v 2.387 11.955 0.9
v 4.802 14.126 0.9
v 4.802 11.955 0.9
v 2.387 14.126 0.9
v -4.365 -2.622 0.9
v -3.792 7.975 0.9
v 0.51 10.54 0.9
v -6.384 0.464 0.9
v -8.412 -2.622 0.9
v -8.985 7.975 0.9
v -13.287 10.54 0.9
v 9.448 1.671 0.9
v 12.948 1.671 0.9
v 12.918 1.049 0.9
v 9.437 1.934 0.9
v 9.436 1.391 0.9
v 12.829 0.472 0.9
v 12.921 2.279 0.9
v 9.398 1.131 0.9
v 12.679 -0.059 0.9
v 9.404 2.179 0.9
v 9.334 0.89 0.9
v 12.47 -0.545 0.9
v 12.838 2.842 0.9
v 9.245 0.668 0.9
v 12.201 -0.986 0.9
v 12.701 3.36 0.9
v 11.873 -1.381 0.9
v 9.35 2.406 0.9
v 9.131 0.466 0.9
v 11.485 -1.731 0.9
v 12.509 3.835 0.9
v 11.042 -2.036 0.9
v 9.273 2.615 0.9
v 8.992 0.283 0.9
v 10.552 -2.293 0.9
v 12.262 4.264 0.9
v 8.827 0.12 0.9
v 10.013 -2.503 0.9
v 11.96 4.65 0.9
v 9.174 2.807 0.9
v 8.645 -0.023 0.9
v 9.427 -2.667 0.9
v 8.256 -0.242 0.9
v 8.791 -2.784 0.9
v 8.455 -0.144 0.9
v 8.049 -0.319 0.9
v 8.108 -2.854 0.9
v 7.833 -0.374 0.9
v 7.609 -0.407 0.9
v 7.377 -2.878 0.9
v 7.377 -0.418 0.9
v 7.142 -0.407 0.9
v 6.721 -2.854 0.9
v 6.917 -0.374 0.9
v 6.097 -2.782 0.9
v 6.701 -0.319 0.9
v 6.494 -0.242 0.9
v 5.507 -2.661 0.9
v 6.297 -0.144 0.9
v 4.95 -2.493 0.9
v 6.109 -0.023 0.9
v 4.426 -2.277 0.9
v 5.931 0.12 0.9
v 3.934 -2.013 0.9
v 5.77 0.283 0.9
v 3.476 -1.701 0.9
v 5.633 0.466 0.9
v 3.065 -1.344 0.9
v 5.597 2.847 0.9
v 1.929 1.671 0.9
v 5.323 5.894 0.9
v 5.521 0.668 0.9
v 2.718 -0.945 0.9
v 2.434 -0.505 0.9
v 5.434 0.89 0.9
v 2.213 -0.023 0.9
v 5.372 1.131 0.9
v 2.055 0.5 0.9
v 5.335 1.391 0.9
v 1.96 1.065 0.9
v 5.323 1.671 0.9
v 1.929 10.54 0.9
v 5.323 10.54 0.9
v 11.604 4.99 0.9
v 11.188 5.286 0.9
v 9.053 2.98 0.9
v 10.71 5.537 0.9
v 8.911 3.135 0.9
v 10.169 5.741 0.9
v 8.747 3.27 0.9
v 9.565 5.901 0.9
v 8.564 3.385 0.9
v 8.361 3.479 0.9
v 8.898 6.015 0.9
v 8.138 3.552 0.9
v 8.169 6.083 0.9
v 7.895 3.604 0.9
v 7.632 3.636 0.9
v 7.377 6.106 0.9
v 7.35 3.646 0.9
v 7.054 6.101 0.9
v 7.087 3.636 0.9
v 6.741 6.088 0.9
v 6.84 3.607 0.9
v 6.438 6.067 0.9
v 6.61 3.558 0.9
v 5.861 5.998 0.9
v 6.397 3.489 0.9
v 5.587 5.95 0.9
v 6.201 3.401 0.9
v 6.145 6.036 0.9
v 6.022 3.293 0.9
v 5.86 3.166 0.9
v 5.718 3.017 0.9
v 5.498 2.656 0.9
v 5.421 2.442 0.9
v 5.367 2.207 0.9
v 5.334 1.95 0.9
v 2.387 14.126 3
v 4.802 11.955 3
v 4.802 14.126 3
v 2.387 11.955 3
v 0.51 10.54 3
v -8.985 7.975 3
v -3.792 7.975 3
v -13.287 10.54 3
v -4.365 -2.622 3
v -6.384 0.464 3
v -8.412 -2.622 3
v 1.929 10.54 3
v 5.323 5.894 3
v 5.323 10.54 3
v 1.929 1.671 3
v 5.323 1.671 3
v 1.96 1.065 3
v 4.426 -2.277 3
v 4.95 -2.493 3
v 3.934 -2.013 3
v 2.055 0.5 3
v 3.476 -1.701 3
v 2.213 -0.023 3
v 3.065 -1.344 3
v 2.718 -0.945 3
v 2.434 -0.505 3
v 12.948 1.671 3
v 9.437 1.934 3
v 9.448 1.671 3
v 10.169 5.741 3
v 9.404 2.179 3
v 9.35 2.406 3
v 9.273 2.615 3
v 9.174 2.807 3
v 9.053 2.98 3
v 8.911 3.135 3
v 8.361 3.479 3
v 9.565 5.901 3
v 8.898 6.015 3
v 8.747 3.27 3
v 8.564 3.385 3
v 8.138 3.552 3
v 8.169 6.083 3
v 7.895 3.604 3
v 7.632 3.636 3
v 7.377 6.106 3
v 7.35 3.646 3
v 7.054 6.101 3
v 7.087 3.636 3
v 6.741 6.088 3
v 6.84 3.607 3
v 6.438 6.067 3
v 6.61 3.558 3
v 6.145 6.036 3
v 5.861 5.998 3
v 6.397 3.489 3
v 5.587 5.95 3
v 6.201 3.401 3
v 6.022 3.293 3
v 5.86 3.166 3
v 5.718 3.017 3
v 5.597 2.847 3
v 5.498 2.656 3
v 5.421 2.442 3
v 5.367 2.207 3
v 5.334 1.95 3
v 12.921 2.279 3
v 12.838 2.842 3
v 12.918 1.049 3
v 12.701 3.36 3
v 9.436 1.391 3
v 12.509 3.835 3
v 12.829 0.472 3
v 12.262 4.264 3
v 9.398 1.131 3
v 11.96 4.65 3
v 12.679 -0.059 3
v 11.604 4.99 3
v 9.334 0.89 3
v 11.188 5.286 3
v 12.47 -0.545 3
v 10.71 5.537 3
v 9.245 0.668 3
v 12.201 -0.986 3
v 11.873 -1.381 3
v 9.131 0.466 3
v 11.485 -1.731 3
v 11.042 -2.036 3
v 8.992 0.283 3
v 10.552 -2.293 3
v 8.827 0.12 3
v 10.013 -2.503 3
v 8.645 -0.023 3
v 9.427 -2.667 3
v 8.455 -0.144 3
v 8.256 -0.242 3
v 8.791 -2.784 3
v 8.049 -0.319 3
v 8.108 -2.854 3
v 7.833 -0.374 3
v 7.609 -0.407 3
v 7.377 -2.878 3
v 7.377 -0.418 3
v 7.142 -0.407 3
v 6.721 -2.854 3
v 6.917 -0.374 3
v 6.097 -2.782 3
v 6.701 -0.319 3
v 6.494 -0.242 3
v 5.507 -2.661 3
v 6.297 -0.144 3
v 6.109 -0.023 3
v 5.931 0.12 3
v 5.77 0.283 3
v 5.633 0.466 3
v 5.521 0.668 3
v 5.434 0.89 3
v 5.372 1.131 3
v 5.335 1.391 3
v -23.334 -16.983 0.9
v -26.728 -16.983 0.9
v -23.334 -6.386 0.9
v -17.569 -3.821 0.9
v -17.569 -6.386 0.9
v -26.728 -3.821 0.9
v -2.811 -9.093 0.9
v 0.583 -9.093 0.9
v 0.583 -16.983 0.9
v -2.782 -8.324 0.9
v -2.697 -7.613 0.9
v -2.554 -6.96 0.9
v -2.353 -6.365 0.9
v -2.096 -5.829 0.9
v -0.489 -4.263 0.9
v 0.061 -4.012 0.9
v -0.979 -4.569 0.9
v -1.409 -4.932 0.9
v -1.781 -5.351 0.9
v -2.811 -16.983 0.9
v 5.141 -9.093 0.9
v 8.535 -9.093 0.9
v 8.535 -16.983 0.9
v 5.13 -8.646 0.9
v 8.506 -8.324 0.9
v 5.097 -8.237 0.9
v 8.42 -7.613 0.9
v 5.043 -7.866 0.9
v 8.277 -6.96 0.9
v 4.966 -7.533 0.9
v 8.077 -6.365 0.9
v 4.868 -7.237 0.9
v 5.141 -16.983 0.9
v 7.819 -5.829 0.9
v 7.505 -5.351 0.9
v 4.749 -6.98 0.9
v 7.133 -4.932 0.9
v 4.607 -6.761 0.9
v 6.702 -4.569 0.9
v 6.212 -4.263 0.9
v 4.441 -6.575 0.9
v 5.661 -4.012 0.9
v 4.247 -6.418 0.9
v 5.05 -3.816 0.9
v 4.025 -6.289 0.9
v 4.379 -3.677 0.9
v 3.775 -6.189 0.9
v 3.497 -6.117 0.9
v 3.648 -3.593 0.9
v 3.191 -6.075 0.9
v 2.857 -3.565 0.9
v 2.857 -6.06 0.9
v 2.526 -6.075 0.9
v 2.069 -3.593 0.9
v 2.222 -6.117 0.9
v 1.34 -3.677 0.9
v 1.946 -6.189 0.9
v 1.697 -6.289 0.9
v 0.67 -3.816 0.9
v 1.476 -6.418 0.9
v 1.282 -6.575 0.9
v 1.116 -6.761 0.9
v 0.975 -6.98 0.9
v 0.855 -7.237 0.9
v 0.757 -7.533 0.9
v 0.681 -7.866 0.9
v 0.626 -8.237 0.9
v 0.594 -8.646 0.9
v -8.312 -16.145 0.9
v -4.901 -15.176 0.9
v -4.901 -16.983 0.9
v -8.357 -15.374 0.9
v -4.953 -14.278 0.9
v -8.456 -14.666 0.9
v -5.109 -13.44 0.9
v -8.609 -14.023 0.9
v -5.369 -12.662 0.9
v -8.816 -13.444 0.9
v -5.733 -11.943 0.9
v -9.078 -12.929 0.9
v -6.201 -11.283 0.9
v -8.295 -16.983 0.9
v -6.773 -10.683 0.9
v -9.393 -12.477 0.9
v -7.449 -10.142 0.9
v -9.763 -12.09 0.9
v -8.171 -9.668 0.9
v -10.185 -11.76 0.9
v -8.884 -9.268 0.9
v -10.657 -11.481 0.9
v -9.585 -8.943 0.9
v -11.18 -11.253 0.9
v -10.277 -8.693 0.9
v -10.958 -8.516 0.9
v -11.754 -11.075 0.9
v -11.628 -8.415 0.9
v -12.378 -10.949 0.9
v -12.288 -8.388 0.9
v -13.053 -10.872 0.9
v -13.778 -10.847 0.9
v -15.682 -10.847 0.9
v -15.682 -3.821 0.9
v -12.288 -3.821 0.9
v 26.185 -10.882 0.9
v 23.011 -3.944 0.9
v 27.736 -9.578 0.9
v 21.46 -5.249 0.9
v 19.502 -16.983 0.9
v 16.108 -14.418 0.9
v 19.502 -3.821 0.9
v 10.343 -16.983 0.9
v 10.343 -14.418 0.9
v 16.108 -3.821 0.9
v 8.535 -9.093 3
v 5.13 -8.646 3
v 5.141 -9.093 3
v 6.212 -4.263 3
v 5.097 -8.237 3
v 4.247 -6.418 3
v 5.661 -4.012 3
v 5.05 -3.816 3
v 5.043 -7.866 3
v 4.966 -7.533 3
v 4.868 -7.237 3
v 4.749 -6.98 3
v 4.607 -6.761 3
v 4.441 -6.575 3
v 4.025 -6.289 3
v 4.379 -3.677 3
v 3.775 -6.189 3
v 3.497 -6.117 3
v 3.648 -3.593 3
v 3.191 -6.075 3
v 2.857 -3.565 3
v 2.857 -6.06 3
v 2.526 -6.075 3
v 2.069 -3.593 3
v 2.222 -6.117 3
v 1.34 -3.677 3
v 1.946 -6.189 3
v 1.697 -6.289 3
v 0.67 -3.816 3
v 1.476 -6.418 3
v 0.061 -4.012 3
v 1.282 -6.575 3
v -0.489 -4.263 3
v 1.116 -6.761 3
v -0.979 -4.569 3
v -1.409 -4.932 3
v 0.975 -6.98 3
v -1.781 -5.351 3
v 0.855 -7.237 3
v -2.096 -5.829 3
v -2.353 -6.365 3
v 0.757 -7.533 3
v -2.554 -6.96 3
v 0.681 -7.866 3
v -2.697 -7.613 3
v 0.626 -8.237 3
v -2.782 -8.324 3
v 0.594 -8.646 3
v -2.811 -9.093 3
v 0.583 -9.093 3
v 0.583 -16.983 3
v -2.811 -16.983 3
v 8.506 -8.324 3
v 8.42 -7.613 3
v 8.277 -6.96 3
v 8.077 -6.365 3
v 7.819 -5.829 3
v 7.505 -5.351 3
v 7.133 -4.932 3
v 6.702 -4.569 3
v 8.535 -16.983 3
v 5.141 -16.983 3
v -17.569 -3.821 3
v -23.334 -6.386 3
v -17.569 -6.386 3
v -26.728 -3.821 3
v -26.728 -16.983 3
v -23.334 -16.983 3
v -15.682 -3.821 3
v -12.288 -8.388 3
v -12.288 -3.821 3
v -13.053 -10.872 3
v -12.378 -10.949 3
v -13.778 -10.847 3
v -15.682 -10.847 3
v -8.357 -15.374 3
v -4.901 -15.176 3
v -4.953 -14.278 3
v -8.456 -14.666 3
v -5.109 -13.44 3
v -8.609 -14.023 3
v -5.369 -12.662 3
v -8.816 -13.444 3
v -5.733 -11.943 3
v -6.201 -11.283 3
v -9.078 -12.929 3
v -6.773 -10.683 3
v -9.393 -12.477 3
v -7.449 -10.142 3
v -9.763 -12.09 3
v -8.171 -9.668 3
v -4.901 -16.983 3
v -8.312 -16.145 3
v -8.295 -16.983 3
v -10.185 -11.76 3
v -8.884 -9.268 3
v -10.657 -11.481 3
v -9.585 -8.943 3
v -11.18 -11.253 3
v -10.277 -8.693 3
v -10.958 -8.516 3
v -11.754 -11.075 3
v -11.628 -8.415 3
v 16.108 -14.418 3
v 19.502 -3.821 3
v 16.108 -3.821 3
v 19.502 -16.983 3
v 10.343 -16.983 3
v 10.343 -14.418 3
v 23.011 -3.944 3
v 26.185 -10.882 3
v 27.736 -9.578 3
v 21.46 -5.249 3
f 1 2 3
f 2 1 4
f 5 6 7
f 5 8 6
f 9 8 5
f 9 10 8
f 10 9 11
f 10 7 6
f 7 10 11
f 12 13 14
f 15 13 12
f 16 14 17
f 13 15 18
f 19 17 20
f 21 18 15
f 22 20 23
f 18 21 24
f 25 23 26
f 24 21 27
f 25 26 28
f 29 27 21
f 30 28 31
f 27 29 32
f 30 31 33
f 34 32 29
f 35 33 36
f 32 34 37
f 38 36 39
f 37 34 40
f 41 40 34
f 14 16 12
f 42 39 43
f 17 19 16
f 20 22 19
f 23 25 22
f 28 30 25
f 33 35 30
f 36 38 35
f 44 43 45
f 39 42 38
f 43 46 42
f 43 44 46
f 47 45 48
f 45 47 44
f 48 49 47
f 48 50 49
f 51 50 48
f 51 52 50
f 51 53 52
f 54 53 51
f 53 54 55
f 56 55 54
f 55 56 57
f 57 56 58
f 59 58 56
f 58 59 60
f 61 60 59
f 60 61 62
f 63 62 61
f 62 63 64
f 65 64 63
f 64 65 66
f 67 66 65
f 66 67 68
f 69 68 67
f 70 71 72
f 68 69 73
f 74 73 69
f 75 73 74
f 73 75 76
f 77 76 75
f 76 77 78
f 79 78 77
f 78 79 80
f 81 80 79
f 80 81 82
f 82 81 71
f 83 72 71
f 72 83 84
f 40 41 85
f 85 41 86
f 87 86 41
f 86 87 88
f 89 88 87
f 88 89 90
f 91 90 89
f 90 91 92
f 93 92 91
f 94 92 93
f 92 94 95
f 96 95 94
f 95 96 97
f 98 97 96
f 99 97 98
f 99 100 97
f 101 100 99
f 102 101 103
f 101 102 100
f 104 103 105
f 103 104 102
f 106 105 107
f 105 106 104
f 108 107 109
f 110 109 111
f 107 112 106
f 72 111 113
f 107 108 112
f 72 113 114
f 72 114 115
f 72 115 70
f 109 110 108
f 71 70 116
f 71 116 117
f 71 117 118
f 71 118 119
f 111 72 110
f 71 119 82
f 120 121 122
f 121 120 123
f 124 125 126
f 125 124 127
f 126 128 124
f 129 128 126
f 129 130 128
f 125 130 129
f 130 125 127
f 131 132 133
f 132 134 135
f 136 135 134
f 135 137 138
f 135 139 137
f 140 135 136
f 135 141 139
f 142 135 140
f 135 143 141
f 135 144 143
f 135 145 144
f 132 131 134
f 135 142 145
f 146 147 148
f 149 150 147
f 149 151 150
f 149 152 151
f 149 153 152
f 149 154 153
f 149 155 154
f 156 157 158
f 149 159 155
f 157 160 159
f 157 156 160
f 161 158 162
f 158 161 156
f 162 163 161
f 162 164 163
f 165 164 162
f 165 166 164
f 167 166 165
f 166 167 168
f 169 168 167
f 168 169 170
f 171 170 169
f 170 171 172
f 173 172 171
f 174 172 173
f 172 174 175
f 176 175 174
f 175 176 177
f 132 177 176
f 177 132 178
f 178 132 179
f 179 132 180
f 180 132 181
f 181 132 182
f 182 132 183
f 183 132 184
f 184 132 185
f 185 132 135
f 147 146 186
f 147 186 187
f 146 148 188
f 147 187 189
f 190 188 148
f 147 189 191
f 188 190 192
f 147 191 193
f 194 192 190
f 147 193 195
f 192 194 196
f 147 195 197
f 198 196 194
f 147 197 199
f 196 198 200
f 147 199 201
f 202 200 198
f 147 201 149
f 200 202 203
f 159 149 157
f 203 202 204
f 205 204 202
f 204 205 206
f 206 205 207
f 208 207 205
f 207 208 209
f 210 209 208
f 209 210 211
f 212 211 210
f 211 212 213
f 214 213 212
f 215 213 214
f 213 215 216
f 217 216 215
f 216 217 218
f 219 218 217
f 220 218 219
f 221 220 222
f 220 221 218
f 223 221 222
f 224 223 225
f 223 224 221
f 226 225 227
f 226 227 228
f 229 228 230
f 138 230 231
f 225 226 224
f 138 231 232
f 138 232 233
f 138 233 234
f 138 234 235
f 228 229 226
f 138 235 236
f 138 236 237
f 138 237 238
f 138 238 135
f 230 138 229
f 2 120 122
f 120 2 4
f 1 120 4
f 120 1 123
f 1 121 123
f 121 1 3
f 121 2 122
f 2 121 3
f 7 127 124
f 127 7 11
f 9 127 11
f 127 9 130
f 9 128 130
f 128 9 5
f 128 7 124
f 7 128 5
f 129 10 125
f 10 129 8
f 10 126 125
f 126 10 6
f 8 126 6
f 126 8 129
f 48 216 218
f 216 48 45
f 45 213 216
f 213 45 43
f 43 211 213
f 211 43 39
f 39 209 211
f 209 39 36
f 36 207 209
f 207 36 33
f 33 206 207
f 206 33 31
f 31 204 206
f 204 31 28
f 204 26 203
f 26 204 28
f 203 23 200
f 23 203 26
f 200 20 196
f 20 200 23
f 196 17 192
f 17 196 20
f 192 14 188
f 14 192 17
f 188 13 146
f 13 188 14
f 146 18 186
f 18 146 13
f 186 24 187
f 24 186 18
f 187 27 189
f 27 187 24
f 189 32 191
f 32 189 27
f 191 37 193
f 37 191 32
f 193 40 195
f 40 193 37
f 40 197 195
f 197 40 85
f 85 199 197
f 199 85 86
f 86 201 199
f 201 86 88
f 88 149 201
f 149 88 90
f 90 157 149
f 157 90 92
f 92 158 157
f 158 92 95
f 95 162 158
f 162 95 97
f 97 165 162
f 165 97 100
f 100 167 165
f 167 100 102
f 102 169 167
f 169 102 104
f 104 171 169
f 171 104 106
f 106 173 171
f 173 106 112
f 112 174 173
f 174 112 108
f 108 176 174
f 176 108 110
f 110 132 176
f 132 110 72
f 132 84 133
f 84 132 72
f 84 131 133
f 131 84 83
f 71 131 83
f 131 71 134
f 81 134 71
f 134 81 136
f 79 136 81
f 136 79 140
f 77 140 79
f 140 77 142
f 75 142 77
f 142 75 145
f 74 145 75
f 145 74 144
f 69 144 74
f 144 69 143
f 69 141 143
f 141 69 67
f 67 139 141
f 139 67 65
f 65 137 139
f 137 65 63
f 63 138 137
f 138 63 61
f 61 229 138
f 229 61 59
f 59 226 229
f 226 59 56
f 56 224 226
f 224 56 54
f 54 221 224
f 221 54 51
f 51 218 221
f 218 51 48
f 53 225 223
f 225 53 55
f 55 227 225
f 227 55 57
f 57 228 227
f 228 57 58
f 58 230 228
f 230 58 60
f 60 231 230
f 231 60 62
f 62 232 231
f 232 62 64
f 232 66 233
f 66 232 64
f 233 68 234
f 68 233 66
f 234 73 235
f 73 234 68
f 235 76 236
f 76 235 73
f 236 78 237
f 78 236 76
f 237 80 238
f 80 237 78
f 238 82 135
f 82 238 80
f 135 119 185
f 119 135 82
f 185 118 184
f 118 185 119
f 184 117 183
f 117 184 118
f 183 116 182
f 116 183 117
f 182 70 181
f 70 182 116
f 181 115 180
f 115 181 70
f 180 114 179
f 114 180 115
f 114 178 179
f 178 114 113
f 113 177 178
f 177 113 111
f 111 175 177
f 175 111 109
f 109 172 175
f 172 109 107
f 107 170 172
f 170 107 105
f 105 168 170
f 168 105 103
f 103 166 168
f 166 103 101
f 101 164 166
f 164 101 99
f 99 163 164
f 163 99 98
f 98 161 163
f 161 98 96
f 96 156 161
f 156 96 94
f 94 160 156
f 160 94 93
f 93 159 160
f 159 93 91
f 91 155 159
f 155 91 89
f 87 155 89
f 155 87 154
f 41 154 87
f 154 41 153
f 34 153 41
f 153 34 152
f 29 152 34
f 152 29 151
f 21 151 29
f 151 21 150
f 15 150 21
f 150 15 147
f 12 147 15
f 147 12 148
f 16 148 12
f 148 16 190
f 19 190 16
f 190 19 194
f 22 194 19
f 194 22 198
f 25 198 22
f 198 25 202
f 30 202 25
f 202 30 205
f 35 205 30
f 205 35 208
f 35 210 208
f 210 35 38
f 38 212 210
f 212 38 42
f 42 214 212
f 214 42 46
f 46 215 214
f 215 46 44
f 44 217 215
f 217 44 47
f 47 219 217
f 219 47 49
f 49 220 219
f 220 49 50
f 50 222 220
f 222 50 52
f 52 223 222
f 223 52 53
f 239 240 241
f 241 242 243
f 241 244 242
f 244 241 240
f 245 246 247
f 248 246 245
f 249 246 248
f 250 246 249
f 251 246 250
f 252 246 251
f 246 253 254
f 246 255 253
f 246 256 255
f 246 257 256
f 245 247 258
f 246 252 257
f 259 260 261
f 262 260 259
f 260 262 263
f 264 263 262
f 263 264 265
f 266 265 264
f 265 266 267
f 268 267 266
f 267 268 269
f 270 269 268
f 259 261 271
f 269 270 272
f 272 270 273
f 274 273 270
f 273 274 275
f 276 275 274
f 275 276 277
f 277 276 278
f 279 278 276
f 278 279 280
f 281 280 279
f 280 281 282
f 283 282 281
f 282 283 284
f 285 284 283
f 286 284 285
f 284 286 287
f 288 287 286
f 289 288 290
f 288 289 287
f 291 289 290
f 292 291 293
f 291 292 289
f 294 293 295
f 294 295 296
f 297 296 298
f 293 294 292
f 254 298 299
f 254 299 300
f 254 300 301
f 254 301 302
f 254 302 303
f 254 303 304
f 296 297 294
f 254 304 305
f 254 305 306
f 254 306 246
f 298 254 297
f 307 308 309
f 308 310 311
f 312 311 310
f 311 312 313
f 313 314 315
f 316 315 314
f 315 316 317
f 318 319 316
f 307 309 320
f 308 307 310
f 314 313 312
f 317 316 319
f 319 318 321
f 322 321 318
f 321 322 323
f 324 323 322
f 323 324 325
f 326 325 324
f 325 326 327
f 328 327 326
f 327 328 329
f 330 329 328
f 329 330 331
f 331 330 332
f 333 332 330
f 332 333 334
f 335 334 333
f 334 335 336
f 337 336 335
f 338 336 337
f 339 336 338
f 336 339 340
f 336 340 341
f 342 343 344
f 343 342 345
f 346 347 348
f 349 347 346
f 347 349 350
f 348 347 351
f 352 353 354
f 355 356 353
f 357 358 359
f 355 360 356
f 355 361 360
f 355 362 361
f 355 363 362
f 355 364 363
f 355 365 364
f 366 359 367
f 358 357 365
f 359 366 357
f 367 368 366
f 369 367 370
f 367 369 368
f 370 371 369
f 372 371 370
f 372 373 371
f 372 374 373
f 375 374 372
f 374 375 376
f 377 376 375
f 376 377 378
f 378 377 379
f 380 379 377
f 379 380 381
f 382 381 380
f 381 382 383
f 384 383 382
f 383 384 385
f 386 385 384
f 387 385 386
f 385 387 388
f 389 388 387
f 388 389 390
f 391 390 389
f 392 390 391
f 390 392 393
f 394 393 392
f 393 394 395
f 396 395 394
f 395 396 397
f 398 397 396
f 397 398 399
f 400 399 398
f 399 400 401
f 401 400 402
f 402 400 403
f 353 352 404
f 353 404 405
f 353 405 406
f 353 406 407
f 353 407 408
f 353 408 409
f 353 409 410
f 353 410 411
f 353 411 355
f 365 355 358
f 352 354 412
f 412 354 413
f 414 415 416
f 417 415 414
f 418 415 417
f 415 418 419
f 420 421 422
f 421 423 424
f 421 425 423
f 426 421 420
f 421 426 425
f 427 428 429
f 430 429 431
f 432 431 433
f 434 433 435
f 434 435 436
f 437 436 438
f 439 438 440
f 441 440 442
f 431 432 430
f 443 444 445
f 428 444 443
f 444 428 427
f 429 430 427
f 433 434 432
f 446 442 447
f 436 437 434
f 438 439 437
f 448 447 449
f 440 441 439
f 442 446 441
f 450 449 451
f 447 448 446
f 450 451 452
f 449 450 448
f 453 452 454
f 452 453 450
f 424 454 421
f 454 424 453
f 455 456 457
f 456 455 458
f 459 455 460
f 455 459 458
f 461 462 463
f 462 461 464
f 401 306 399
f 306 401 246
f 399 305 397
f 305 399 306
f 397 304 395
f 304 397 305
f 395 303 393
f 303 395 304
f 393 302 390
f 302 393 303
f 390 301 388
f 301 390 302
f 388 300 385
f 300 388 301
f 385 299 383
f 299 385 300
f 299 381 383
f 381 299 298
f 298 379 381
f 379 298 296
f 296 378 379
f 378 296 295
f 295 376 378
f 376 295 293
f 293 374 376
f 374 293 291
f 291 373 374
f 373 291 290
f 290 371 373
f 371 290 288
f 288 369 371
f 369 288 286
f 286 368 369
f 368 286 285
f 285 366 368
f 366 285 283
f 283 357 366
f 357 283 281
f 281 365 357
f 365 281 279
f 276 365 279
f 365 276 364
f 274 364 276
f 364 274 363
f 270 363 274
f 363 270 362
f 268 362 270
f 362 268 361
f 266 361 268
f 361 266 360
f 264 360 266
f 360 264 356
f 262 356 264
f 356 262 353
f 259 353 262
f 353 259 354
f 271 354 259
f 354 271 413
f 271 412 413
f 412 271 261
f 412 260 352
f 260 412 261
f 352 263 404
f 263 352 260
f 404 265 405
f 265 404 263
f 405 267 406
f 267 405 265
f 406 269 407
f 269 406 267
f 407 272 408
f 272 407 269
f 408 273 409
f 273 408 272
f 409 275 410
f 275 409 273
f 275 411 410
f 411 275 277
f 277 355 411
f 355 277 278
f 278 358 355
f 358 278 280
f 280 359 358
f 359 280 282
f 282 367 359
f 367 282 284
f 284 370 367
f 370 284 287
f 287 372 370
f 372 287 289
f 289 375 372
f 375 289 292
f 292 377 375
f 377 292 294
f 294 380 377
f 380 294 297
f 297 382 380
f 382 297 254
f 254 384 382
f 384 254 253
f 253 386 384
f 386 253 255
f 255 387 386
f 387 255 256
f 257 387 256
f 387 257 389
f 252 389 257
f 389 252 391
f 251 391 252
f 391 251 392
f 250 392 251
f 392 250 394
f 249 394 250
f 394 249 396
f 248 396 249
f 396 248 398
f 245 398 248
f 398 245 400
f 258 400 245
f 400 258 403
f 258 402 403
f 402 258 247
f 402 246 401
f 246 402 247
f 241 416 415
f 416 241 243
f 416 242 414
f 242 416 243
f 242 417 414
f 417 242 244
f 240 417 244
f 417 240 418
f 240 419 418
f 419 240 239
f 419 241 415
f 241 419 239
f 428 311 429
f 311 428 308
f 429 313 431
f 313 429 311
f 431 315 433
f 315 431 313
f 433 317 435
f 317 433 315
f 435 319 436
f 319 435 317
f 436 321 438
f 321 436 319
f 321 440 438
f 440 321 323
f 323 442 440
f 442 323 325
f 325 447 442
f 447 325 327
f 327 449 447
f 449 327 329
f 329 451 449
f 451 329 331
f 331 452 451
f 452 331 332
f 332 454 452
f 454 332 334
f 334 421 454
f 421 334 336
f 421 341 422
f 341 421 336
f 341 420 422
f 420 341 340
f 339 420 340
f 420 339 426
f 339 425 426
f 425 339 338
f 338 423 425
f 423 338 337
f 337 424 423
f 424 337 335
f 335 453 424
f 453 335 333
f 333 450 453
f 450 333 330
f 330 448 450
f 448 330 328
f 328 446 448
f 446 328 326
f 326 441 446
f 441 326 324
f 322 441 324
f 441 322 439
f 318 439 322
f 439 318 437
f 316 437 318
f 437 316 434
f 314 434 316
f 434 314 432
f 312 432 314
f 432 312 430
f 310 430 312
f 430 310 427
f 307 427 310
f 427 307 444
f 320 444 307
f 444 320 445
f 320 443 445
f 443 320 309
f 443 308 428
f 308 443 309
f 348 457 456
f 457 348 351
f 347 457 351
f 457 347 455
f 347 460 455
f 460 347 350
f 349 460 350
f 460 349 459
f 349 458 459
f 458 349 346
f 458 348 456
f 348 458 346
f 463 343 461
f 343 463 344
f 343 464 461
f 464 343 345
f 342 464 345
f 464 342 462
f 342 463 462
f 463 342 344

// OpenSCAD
$fn = 48;
  // syllabics (overlaid on icon, tallest)
  translate([0, 5.430, 0.900]) linear_extrude(height=2.100) text("ᐁᑳ", size=13.000, halign="center", valign="center", font="Euphemia UCAS:style=Bold");
  translate([0, -10.430, 0.900]) linear_extrude(height=2.100) text("ᒥᓴᑎᒧᐠ", size=13.000, halign="center", valign="center", font="Euphemia UCAS:style=Bold");
